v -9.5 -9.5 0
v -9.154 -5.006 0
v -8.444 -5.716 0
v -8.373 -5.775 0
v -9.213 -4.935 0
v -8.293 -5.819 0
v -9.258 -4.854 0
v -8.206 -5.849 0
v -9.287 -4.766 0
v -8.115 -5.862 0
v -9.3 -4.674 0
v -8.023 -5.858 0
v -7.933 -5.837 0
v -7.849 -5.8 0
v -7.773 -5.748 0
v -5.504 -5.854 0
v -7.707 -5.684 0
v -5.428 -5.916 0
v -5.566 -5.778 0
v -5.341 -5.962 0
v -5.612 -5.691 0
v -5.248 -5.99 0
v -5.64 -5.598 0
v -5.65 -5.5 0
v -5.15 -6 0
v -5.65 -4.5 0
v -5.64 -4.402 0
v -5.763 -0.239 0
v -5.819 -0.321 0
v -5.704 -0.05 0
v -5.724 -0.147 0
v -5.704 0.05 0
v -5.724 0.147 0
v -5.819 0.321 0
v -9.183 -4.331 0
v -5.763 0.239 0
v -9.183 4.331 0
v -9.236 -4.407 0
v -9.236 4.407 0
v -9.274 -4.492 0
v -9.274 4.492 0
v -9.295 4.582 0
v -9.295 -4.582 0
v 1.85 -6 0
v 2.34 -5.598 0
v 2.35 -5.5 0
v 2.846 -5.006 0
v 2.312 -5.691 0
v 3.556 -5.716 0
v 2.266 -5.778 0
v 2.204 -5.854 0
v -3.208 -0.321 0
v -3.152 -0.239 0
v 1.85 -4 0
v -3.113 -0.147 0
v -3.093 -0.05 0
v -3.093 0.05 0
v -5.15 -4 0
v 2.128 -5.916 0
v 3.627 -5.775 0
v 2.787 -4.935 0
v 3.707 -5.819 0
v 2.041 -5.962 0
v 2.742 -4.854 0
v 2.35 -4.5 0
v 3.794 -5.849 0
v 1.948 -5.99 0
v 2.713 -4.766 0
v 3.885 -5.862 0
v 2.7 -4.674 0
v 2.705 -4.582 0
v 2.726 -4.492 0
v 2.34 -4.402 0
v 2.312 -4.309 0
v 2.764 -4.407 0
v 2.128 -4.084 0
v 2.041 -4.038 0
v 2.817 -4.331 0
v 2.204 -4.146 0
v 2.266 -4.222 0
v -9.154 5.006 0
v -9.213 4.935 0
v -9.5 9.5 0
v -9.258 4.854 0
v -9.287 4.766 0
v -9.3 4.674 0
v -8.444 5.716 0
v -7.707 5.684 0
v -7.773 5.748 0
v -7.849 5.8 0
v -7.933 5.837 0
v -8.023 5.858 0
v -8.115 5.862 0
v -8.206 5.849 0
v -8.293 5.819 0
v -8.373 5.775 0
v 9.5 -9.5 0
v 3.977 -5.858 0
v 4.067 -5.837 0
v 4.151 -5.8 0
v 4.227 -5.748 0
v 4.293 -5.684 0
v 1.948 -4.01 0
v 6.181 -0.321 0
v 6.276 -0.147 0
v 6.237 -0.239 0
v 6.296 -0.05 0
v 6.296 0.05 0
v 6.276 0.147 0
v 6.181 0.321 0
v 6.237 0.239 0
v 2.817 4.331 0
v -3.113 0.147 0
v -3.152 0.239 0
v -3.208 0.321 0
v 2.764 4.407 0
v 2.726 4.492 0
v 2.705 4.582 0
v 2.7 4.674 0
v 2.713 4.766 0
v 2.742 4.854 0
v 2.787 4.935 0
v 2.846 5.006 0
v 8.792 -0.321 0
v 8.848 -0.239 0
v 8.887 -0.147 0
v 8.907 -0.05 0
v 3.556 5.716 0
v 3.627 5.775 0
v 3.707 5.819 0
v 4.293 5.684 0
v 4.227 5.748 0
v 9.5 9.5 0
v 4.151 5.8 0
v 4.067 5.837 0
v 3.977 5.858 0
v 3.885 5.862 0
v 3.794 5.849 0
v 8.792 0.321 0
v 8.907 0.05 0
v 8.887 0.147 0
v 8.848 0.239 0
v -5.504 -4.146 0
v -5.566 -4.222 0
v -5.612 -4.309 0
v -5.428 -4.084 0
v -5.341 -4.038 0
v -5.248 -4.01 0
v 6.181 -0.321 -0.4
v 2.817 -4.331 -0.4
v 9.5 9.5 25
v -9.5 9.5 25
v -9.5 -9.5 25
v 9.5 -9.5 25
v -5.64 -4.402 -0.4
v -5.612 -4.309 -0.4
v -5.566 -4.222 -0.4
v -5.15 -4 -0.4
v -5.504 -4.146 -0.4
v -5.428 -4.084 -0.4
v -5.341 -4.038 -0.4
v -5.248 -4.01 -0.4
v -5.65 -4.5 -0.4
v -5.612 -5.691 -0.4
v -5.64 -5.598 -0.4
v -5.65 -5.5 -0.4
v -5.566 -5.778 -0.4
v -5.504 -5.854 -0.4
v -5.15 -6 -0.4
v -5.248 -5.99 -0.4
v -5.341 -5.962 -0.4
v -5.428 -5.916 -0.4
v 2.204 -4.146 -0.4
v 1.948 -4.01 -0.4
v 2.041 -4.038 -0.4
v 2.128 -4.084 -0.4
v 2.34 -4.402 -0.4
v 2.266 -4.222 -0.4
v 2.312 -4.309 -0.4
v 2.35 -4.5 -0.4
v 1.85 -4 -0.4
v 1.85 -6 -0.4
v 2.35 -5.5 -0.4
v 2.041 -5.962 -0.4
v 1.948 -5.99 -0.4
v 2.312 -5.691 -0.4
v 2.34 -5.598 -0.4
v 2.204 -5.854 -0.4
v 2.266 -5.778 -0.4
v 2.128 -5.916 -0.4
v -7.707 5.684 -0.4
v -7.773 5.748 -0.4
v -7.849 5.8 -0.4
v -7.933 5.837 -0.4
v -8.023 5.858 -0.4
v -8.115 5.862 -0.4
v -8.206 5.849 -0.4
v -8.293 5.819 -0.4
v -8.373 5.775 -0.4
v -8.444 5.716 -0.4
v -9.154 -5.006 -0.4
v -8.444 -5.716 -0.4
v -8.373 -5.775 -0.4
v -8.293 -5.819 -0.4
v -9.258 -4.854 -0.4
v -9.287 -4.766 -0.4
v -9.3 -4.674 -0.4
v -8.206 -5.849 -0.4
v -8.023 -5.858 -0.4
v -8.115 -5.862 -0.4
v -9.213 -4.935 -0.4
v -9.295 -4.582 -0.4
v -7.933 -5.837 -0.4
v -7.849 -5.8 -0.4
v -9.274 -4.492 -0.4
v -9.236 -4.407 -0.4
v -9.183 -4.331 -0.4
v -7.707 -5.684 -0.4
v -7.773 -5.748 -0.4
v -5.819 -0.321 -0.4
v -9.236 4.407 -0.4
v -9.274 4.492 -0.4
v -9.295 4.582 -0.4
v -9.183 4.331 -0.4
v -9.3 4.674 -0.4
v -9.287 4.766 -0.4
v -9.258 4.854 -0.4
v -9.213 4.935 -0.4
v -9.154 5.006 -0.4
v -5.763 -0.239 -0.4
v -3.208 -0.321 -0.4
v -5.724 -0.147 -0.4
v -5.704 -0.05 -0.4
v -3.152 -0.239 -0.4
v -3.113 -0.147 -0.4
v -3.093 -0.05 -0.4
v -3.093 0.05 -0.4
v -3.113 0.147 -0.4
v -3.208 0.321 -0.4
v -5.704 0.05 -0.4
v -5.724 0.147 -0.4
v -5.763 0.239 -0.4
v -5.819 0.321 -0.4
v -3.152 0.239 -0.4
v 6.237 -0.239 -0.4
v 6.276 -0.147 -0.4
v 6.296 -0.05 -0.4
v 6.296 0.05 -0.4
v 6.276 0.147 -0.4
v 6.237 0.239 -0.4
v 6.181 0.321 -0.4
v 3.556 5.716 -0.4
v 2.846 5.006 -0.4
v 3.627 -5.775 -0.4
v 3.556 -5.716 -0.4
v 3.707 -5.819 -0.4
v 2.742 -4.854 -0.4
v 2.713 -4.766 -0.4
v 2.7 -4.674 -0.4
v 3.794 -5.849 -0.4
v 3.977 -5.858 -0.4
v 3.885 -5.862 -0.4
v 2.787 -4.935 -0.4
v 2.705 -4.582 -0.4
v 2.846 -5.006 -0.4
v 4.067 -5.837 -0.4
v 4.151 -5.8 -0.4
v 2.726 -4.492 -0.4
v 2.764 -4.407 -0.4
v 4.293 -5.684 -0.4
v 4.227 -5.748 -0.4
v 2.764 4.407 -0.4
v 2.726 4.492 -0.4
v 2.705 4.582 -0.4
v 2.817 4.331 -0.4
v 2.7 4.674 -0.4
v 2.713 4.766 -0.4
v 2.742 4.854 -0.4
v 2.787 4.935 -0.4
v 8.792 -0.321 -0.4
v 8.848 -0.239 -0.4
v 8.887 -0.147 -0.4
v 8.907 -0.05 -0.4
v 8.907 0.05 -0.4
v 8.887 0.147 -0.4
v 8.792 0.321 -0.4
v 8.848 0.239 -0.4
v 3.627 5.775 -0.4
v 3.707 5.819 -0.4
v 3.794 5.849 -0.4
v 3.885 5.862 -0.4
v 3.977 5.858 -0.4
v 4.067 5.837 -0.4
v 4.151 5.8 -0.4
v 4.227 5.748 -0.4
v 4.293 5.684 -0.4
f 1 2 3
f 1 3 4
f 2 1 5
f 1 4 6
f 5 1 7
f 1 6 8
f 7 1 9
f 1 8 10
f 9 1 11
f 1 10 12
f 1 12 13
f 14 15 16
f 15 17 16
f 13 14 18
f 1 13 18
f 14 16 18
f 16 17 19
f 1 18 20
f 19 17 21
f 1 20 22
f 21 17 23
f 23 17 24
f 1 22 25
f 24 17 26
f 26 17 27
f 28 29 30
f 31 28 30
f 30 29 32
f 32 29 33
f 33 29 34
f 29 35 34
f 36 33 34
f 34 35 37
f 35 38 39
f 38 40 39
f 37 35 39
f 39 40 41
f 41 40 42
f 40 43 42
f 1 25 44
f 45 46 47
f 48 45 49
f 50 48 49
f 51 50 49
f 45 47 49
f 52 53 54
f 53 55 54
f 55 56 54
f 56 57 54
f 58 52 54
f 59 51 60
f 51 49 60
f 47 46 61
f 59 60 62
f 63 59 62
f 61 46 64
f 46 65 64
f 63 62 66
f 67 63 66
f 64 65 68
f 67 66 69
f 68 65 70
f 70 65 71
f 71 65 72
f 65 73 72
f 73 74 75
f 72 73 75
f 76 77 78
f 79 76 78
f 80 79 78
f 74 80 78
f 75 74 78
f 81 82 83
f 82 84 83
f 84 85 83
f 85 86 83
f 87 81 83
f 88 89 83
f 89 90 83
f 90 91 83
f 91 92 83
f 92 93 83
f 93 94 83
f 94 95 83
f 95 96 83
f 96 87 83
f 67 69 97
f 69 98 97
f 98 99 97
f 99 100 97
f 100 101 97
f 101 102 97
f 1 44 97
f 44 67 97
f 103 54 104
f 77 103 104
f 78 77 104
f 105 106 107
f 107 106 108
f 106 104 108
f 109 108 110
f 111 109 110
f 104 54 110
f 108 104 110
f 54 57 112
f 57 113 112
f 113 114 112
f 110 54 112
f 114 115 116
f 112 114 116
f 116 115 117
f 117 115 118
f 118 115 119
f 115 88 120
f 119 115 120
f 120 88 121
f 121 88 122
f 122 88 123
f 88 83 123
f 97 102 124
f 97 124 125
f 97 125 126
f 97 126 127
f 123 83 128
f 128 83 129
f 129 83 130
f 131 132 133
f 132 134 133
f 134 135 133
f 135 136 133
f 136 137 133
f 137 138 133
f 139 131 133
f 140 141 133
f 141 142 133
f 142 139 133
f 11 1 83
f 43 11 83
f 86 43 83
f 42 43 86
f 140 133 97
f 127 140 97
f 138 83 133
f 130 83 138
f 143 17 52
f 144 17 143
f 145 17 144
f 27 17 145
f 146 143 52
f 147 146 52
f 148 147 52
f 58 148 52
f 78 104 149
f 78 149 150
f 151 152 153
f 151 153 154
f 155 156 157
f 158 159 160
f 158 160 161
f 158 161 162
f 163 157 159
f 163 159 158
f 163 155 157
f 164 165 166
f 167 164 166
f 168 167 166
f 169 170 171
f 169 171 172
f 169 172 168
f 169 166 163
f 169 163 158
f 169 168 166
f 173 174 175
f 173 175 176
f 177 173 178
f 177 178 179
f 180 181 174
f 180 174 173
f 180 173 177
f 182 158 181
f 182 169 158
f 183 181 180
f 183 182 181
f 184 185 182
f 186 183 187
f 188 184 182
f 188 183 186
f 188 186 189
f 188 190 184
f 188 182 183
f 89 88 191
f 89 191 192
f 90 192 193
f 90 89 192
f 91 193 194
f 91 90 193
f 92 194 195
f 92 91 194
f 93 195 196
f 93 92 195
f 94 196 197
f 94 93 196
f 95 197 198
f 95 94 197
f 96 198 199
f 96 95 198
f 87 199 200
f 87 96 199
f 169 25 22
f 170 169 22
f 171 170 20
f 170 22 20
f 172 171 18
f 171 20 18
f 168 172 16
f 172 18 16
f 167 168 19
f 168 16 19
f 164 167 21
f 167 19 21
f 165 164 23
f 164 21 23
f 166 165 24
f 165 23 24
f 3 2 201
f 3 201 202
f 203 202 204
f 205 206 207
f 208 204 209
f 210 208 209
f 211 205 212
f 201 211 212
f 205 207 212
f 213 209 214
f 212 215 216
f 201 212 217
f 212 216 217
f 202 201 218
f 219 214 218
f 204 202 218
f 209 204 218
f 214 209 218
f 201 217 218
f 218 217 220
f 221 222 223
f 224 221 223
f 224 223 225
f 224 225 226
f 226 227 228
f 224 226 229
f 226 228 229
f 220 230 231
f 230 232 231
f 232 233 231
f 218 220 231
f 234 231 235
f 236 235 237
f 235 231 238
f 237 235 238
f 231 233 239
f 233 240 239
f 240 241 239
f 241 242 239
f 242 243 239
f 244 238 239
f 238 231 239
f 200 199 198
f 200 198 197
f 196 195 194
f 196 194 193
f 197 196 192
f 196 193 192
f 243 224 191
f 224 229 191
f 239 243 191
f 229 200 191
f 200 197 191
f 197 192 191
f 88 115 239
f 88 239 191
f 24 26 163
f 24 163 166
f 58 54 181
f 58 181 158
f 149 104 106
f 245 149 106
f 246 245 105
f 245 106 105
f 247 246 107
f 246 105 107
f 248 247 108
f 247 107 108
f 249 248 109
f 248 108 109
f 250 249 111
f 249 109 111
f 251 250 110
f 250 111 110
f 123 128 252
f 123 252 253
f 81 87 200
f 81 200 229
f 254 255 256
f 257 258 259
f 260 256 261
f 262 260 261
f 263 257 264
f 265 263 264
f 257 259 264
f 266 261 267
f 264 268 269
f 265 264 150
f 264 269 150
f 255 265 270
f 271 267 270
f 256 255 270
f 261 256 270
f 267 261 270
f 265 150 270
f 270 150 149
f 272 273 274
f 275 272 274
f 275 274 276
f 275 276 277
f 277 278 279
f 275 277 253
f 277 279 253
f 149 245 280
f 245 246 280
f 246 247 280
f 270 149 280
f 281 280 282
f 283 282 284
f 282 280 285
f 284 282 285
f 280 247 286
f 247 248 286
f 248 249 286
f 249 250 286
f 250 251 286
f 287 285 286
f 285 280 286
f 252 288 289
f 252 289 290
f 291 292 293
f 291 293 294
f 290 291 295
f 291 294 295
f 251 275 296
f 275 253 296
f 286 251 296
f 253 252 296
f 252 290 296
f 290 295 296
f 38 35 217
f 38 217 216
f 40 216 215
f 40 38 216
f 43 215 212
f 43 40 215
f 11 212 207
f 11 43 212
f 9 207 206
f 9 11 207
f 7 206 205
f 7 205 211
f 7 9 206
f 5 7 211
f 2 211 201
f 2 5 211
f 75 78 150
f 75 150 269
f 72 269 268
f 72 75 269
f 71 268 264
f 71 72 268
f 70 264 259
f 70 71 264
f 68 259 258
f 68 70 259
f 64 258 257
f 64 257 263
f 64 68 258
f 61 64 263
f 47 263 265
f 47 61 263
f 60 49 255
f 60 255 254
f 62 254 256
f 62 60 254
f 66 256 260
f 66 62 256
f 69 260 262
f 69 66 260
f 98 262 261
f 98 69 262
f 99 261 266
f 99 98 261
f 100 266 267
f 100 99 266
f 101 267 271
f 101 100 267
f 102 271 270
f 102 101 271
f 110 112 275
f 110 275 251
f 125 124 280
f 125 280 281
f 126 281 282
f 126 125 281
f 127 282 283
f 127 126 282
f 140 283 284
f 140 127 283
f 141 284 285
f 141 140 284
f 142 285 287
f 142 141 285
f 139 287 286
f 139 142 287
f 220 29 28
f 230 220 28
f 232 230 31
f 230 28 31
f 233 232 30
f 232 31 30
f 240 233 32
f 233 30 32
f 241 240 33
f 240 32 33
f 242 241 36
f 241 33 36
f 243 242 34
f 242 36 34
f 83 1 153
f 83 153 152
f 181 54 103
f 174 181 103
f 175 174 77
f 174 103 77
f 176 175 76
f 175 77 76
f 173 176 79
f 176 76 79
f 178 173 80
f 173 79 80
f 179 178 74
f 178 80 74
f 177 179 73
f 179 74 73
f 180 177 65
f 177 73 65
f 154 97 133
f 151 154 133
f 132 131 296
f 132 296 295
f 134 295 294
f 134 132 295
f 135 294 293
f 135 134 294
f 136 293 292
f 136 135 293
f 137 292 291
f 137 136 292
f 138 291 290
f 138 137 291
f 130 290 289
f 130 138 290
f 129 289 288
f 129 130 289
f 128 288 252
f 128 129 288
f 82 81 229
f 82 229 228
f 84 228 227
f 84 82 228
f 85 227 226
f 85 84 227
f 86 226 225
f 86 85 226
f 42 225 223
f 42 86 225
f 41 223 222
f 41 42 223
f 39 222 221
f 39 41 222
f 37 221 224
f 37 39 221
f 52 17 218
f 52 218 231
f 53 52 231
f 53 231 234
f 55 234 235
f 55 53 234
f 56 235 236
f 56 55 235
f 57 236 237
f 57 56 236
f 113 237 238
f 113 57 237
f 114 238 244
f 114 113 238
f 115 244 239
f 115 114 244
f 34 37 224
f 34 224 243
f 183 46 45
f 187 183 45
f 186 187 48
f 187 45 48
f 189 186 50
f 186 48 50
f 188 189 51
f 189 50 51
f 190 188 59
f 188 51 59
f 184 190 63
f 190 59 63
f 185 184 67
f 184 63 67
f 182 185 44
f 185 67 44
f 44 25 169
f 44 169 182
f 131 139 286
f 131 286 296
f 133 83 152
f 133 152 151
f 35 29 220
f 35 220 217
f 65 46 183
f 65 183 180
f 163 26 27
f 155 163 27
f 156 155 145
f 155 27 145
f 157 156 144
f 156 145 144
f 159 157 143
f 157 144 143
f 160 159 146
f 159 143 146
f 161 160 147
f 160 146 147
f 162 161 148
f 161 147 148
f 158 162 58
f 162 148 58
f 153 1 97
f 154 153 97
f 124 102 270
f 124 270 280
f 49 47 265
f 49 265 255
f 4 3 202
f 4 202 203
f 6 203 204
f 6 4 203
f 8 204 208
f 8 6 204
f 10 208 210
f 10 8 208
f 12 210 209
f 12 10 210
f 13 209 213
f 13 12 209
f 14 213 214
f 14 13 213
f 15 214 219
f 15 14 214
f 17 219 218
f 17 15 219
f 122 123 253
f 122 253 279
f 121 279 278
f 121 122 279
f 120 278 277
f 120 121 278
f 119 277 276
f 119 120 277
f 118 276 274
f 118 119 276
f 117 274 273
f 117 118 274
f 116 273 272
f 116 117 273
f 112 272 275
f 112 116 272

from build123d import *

# Parameters (mm, degrees)
SKETCH_W            = 19
SKETCH_H            = 19
PAD_DEPTH           = 25
PAD001_DEPTH        = 0.4
LINEARPATTERN_COUNT = 2
LINEARPATTERN_PITCH = 12
PAD002_DEPTH        = 0.4


with BuildPart() as part:
    # Sketch → Pad (new body)
    with BuildSketch(Plane.XY):
        Rectangle(SKETCH_W, SKETCH_H)
    extrude(amount=PAD_DEPTH)

    # Sketch001 → Pad001 (join)
    with BuildSketch(Plane.XY):
        with BuildLine():
            Line((-9.183343, 4.331109), (-5.818792, 0.321394))
            ThreePointArc((-5.818792, -0.321394), (-5.701815, 0), (-5.818792, 0.321394))
            Line((-5.818792, -0.321394), (-9.183343, -4.331109))
            ThreePointArc((-9.183343, -4.331109), (-9.299845, -4.674313), (-9.153874, -5.006057))
            Line((-9.153874, -5.006057), (-8.444067, -5.715864))
            ThreePointArc((-8.444067, -5.715864), (-8.068704, -5.861835), (-7.707491, -5.683705))
            Line((-7.707491, -5.683705), (-3.207978, -0.321394))
            ThreePointArc((-3.207978, -0.321394), (-3.091, 0), (-3.207978, 0.321394))
            Line((-3.207978, 0.321394), (-7.707491, 5.683705))
            ThreePointArc((-7.707491, 5.683705), (-8.068704, 5.861835), (-8.444067, 5.715864))
            Line((-8.444067, 5.715864), (-9.153874, 5.006057))
            ThreePointArc((-9.153874, 5.006057), (-9.299845, 4.674313), (-9.183343, 4.331109))
        make_face()
    pad001 = extrude(amount=-PAD001_DEPTH)

    # LinearPattern: Pad001 ×2
    with Locations(*[(i * LINEARPATTERN_PITCH, 0, 0) for i in range(1, LINEARPATTERN_COUNT)]):
        add(pad001)

    # Sketch002 → Pad002 (join)
    with BuildSketch(Plane(origin=(0, 0, 0), x_dir=(1, 0, 0), z_dir=(0, 0, -1))):
        with BuildLine():
            ThreePointArc((-5.15, 6), (-5.503553, 5.853553), (-5.65, 5.5))
            Line((-5.65, 4.5), (-5.65, 5.5))
            ThreePointArc((-5.65, 4.5), (-5.503553, 4.146447), (-5.15, 4))
            Line((1.85, 4), (-5.15, 4))
            ThreePointArc((1.85, 4), (2.203553, 4.146447), (2.35, 4.5))
            Line((2.35, 5.5), (2.35, 4.5))
            ThreePointArc((2.35, 5.5), (2.203553, 5.853553), (1.85, 6))
            Line((-5.15, 6), (1.85, 6))
        make_face()
    extrude(amount=PAD002_DEPTH)


solid = part.part
